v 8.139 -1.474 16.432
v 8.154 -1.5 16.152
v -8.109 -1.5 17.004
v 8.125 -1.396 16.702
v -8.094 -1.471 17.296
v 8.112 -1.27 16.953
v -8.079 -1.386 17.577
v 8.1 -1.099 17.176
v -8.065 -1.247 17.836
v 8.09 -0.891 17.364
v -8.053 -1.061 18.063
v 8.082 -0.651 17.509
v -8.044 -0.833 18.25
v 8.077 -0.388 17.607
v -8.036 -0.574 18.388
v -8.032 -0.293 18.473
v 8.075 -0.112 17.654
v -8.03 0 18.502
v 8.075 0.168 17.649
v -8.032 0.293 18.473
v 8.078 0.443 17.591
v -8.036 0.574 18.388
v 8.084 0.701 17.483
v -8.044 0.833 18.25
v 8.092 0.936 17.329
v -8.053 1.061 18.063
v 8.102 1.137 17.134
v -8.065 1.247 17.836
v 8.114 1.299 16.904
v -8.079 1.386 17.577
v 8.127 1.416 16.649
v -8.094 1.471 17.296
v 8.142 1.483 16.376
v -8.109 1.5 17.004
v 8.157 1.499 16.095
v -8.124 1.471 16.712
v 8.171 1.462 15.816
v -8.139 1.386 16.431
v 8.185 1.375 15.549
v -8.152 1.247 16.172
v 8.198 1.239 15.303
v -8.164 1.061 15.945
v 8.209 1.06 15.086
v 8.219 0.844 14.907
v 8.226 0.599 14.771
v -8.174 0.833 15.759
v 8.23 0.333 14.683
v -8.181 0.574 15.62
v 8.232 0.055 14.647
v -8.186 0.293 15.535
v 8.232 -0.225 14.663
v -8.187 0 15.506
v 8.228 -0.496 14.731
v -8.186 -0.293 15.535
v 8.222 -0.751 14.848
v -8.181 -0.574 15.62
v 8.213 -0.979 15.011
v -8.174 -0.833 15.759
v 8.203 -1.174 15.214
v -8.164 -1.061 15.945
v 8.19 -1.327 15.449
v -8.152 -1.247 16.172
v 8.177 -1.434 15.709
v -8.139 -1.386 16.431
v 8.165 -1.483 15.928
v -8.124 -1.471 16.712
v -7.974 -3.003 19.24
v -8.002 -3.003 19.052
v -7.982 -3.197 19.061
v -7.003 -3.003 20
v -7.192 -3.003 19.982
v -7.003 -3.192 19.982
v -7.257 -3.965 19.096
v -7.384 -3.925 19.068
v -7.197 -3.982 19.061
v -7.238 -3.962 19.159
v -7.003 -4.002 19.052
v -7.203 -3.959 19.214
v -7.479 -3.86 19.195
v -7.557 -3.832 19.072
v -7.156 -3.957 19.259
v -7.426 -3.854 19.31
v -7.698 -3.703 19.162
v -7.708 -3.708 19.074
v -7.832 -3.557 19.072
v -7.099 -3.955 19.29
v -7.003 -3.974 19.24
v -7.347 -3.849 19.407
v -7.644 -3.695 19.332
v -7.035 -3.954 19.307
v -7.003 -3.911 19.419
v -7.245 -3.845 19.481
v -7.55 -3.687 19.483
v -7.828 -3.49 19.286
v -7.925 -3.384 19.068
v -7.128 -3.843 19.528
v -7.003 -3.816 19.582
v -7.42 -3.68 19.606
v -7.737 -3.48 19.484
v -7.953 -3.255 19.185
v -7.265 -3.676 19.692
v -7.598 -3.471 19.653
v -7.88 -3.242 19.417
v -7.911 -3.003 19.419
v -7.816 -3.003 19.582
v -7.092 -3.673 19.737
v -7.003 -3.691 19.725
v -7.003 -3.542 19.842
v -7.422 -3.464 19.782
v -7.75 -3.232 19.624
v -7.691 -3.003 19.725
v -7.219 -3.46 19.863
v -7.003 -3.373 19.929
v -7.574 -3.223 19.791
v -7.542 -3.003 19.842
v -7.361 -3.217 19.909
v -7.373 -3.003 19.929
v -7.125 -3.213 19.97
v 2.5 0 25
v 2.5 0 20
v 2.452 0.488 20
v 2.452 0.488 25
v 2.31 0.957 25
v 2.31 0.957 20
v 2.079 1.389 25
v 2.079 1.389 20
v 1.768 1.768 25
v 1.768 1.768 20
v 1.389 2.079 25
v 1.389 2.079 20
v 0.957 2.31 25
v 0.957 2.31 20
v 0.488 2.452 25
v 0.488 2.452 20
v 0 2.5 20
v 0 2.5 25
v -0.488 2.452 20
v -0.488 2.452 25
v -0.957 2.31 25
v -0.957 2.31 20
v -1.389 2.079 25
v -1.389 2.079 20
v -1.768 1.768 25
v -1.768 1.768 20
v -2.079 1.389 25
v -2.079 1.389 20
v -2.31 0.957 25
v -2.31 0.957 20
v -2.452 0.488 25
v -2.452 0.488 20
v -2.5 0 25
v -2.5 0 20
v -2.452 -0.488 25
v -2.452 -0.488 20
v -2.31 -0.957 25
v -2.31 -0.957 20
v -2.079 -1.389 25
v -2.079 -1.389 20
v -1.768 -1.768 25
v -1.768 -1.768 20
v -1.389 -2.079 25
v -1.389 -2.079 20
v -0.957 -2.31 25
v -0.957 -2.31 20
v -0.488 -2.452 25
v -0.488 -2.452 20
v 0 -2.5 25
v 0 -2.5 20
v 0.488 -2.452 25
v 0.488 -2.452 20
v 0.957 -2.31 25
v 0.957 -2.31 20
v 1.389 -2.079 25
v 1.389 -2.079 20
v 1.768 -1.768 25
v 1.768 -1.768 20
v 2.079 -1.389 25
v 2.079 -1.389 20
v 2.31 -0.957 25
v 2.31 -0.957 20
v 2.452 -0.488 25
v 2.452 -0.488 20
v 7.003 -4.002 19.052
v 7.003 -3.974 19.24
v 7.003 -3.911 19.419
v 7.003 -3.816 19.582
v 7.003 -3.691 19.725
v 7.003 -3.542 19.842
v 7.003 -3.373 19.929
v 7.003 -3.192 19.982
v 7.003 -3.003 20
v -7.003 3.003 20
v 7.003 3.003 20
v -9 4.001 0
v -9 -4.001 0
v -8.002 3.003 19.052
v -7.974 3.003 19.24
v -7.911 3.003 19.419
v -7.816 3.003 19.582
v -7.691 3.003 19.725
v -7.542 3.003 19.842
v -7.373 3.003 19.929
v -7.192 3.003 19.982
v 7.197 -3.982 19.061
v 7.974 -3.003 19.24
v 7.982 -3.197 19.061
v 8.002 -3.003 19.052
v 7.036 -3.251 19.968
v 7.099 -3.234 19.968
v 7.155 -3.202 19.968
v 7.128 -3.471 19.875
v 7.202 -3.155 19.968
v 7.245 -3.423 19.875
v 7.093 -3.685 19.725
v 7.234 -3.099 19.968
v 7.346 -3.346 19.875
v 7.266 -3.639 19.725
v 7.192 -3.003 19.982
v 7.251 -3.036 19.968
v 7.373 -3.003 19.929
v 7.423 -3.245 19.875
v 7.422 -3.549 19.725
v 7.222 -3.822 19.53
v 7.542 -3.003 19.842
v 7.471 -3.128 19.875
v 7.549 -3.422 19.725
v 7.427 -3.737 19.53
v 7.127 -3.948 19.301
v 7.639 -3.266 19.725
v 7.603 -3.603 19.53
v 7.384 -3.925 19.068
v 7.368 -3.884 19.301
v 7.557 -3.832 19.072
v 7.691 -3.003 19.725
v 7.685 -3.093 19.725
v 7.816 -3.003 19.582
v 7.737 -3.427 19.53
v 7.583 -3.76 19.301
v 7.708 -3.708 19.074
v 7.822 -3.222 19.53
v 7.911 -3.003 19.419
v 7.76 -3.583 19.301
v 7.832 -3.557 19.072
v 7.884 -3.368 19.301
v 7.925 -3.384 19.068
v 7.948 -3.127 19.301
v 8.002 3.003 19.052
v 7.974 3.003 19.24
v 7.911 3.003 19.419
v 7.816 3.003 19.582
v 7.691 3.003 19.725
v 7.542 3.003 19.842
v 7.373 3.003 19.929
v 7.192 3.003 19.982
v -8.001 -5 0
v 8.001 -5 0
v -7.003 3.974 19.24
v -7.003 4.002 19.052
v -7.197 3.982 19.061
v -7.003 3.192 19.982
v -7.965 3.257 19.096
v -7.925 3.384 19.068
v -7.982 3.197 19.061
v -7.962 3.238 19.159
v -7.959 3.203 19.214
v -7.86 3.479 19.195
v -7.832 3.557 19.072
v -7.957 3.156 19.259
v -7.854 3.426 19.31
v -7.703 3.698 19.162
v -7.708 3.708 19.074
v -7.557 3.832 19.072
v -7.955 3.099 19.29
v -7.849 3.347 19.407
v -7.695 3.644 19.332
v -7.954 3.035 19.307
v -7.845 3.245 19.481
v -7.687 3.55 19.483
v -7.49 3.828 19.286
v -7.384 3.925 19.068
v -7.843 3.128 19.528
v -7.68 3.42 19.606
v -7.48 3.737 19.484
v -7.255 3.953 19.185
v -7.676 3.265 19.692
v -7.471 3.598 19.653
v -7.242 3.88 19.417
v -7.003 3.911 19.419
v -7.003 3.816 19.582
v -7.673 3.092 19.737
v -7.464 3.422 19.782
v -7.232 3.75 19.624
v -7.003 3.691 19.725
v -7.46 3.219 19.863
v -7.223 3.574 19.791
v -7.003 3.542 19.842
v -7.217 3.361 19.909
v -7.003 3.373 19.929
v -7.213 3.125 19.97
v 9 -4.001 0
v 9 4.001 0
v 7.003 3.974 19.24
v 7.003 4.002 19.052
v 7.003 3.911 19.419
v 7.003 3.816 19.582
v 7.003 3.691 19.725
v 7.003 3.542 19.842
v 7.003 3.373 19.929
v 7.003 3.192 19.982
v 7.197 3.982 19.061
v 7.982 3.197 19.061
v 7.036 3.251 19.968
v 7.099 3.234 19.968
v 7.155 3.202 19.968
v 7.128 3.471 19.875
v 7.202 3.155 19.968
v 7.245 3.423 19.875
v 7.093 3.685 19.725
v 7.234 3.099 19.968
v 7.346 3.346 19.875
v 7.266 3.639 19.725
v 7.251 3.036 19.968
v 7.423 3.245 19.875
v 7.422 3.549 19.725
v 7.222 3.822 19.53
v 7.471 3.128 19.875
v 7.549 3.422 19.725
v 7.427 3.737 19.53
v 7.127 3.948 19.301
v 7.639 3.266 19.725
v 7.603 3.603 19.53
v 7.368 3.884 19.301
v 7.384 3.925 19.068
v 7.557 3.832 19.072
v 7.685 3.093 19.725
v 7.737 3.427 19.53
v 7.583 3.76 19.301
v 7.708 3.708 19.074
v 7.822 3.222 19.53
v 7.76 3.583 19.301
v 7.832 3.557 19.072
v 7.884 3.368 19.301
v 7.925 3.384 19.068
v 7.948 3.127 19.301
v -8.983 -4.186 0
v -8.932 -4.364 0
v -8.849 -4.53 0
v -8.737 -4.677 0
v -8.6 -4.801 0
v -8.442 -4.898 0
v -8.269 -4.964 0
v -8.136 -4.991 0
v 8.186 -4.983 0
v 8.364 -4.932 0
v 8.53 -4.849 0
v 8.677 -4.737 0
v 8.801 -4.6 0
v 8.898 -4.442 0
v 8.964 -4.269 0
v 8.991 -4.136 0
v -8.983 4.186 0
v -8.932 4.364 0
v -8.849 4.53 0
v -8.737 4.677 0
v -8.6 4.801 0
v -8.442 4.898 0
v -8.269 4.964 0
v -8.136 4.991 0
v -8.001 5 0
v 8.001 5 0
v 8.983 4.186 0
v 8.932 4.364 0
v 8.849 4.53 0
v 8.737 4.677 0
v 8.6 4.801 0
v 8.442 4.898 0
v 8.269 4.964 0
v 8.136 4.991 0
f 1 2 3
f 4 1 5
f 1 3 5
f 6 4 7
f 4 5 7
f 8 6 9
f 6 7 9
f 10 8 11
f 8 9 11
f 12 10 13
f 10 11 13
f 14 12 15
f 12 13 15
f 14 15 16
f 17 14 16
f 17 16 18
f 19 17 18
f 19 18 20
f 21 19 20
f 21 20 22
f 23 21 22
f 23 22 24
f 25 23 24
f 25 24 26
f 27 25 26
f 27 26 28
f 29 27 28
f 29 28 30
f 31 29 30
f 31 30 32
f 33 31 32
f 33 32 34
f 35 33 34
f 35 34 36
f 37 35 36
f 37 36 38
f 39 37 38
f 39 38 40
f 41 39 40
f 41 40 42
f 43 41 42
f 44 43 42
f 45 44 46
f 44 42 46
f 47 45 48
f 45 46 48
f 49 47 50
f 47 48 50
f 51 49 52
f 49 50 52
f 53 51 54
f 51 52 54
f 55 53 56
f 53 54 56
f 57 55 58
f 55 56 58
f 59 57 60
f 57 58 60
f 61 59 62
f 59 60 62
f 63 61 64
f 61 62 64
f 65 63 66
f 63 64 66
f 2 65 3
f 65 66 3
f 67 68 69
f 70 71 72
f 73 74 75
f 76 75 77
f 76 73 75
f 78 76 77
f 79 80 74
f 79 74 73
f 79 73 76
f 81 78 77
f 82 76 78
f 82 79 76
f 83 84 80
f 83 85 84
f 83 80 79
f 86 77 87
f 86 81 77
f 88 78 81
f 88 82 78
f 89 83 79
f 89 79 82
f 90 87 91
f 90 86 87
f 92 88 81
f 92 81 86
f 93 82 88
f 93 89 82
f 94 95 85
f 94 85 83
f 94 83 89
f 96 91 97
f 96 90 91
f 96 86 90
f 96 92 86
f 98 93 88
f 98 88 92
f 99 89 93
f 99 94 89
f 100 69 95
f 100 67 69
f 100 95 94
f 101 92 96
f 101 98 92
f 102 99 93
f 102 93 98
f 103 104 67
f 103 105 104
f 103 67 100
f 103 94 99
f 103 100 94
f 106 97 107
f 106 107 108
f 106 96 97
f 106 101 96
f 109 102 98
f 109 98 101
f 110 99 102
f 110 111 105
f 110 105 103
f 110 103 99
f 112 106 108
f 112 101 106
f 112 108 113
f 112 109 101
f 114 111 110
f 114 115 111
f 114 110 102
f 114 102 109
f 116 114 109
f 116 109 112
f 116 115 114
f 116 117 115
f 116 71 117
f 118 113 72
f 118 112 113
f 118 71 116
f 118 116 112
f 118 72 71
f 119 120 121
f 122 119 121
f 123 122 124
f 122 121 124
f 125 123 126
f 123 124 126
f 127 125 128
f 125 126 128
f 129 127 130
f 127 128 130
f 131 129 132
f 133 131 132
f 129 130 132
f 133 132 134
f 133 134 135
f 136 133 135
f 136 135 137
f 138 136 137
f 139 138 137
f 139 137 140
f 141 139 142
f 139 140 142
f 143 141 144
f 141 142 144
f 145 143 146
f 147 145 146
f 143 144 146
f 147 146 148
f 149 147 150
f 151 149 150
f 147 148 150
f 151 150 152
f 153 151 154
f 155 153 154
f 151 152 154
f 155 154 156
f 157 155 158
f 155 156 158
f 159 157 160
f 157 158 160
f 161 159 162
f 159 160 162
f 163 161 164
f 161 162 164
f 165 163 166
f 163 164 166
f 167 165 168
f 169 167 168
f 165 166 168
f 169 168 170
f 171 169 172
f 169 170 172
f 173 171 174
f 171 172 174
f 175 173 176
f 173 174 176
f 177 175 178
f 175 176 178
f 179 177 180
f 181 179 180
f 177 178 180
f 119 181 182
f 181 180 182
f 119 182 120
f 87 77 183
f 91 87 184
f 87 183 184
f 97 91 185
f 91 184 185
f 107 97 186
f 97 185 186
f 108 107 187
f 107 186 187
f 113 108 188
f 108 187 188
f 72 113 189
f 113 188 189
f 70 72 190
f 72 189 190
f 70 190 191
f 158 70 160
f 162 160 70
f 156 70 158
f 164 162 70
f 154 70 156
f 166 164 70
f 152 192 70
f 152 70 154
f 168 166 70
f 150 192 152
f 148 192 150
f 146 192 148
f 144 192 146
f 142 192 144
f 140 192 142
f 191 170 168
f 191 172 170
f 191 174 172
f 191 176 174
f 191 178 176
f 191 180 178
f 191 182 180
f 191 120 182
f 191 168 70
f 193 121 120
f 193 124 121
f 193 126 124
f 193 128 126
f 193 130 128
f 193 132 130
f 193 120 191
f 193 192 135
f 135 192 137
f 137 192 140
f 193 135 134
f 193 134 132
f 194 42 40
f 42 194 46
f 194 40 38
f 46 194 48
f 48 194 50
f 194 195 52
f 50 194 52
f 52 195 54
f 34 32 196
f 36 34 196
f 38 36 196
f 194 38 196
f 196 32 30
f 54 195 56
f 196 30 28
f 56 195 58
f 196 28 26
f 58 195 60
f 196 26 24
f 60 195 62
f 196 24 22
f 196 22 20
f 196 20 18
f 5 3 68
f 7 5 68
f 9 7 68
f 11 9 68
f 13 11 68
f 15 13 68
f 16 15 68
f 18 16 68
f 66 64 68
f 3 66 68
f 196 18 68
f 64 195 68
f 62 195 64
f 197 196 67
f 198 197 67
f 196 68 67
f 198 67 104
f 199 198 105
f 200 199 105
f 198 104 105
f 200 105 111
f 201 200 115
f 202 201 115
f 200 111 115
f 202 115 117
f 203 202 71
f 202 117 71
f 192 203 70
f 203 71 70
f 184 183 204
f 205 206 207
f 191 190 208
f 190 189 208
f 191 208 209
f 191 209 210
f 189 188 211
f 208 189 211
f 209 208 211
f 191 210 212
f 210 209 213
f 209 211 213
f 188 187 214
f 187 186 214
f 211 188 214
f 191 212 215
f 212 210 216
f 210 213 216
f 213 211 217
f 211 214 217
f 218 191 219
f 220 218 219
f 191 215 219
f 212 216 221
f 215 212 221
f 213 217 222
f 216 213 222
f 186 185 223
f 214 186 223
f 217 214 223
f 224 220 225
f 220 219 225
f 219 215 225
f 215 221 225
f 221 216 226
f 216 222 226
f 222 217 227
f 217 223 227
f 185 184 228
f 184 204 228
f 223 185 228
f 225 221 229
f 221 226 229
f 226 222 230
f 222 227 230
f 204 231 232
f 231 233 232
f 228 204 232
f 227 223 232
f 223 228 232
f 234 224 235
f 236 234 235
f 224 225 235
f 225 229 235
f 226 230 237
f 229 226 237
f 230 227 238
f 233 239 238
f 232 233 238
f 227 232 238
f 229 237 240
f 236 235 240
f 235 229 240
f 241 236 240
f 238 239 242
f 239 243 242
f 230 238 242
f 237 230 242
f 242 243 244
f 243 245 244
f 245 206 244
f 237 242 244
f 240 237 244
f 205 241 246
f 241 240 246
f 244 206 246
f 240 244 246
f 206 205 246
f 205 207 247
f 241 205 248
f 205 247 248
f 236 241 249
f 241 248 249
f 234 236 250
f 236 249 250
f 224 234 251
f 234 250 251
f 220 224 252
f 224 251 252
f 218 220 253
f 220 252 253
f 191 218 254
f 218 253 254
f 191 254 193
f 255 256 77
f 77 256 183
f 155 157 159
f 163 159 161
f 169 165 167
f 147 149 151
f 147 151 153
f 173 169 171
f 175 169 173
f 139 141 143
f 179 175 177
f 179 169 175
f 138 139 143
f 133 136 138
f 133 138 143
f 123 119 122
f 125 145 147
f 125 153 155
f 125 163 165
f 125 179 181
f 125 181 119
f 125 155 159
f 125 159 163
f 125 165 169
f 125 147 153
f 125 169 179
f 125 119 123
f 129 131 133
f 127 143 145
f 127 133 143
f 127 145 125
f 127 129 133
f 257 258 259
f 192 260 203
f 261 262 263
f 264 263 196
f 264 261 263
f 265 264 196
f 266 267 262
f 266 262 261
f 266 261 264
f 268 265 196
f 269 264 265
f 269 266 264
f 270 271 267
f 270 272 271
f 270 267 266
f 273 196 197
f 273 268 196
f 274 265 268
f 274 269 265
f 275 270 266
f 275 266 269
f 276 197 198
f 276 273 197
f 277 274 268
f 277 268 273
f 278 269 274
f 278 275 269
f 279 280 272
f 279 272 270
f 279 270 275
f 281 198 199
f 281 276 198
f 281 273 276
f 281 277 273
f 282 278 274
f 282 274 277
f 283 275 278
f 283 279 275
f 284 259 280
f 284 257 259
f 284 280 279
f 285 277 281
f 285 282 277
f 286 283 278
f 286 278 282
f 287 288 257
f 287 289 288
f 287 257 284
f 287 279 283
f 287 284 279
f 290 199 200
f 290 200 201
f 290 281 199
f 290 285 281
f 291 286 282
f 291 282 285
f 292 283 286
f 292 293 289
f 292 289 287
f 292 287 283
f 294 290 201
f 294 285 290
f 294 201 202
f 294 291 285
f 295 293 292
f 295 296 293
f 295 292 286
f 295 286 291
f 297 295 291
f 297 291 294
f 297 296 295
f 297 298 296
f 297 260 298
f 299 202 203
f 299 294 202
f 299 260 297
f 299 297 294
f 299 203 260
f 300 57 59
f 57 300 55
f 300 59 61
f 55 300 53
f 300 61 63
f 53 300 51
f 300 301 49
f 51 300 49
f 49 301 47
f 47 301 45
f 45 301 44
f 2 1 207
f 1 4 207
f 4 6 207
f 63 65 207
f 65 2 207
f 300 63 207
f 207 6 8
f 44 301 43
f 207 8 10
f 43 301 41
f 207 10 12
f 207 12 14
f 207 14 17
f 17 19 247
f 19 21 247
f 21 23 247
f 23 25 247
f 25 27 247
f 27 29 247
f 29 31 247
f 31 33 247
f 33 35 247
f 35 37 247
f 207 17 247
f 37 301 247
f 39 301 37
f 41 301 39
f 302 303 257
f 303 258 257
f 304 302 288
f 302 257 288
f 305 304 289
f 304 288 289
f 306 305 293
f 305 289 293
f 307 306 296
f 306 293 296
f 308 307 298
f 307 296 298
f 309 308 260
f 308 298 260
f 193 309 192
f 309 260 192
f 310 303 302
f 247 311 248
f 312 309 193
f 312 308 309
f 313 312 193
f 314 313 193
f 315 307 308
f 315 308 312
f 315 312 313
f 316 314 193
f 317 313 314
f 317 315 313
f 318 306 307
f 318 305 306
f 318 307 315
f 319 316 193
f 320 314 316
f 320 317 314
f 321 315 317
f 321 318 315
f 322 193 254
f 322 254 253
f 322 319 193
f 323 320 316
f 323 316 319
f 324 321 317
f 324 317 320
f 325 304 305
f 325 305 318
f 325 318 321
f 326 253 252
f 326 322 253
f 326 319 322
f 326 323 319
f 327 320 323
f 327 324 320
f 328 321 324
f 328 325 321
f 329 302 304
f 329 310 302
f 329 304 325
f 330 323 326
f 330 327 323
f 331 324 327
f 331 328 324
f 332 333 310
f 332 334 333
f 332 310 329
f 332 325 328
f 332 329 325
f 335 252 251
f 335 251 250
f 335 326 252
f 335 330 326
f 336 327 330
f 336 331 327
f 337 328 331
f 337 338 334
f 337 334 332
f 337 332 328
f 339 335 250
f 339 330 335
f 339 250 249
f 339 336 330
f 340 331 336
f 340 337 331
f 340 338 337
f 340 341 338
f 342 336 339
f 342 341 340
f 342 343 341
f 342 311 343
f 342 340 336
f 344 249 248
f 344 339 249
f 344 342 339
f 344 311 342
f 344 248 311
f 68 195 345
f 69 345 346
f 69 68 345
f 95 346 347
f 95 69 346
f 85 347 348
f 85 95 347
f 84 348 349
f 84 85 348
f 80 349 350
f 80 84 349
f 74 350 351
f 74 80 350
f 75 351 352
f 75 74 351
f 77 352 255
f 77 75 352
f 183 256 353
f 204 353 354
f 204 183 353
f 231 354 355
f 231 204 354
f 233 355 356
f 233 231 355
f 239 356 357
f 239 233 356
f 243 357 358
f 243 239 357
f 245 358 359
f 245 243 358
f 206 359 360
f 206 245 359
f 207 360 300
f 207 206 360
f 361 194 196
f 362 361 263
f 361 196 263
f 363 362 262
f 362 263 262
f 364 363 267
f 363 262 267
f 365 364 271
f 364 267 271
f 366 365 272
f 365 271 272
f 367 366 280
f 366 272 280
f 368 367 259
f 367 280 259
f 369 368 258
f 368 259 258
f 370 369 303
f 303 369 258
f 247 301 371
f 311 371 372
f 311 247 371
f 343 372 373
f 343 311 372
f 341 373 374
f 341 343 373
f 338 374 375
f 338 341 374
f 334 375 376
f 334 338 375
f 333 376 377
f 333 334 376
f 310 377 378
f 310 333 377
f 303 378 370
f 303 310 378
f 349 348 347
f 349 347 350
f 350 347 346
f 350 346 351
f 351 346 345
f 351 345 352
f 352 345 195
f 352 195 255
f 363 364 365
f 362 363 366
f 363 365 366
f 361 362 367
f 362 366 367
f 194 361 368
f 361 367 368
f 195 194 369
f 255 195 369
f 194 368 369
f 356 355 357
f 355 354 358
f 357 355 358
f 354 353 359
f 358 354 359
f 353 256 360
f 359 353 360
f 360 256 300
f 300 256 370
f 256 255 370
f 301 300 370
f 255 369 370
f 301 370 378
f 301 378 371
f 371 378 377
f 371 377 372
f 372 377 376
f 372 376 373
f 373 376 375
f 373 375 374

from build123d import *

# Parameters (mm, degrees)
F0_W     = 18
F0_H     = 10
F1_DEPTH = 20
F1_TAPER = 3
F2_R     = 2.5
F3_DEPTH = 5
F5_R     = 1
F4_R     = 1.5
F6_DEPTH = 25.4


with BuildPart() as f1:
    # F0 (on Top) → F1 (new body)
    with BuildSketch(Plane.XY):
        Rectangle(F0_W, F0_H)
    extrude(amount=F1_DEPTH, taper=F1_TAPER)

    # F2 (on face) → F3 (join)
    with BuildSketch(Plane.XY.offset(20)):
        Circle(F2_R)
    extrude(amount=F3_DEPTH)

    # F5
    f5_edges = [f1.edges().sort_by_distance(p)[0] for p in [
        (8.475922, 4.475922, 10),
        (0, 3.951844, 20),
        (-8.475922, 4.475922, 10),
        (-7.951844, 0, 20),
        (-8.475922, -4.475922, 10),
        (8.475922, -4.475922, 10),
        (0, -3.951844, 20),
        (7.951844, 0, 20),
    ]]
    fillet(f5_edges, radius=F5_R)

    # F4 (on face) → F6 (cut)
    with BuildSketch(Plane(origin=(-8.9753485292, 0, 0.4703780847), x_dir=(0, -1, 0), z_dir=(-0.9986295348, 0, 0.0523359562))):
        with Locations((0, 16.5564233138)):
            Circle(F4_R)
    extrude(amount=-F6_DEPTH, mode=Mode.SUBTRACT)


solid = f1.part
